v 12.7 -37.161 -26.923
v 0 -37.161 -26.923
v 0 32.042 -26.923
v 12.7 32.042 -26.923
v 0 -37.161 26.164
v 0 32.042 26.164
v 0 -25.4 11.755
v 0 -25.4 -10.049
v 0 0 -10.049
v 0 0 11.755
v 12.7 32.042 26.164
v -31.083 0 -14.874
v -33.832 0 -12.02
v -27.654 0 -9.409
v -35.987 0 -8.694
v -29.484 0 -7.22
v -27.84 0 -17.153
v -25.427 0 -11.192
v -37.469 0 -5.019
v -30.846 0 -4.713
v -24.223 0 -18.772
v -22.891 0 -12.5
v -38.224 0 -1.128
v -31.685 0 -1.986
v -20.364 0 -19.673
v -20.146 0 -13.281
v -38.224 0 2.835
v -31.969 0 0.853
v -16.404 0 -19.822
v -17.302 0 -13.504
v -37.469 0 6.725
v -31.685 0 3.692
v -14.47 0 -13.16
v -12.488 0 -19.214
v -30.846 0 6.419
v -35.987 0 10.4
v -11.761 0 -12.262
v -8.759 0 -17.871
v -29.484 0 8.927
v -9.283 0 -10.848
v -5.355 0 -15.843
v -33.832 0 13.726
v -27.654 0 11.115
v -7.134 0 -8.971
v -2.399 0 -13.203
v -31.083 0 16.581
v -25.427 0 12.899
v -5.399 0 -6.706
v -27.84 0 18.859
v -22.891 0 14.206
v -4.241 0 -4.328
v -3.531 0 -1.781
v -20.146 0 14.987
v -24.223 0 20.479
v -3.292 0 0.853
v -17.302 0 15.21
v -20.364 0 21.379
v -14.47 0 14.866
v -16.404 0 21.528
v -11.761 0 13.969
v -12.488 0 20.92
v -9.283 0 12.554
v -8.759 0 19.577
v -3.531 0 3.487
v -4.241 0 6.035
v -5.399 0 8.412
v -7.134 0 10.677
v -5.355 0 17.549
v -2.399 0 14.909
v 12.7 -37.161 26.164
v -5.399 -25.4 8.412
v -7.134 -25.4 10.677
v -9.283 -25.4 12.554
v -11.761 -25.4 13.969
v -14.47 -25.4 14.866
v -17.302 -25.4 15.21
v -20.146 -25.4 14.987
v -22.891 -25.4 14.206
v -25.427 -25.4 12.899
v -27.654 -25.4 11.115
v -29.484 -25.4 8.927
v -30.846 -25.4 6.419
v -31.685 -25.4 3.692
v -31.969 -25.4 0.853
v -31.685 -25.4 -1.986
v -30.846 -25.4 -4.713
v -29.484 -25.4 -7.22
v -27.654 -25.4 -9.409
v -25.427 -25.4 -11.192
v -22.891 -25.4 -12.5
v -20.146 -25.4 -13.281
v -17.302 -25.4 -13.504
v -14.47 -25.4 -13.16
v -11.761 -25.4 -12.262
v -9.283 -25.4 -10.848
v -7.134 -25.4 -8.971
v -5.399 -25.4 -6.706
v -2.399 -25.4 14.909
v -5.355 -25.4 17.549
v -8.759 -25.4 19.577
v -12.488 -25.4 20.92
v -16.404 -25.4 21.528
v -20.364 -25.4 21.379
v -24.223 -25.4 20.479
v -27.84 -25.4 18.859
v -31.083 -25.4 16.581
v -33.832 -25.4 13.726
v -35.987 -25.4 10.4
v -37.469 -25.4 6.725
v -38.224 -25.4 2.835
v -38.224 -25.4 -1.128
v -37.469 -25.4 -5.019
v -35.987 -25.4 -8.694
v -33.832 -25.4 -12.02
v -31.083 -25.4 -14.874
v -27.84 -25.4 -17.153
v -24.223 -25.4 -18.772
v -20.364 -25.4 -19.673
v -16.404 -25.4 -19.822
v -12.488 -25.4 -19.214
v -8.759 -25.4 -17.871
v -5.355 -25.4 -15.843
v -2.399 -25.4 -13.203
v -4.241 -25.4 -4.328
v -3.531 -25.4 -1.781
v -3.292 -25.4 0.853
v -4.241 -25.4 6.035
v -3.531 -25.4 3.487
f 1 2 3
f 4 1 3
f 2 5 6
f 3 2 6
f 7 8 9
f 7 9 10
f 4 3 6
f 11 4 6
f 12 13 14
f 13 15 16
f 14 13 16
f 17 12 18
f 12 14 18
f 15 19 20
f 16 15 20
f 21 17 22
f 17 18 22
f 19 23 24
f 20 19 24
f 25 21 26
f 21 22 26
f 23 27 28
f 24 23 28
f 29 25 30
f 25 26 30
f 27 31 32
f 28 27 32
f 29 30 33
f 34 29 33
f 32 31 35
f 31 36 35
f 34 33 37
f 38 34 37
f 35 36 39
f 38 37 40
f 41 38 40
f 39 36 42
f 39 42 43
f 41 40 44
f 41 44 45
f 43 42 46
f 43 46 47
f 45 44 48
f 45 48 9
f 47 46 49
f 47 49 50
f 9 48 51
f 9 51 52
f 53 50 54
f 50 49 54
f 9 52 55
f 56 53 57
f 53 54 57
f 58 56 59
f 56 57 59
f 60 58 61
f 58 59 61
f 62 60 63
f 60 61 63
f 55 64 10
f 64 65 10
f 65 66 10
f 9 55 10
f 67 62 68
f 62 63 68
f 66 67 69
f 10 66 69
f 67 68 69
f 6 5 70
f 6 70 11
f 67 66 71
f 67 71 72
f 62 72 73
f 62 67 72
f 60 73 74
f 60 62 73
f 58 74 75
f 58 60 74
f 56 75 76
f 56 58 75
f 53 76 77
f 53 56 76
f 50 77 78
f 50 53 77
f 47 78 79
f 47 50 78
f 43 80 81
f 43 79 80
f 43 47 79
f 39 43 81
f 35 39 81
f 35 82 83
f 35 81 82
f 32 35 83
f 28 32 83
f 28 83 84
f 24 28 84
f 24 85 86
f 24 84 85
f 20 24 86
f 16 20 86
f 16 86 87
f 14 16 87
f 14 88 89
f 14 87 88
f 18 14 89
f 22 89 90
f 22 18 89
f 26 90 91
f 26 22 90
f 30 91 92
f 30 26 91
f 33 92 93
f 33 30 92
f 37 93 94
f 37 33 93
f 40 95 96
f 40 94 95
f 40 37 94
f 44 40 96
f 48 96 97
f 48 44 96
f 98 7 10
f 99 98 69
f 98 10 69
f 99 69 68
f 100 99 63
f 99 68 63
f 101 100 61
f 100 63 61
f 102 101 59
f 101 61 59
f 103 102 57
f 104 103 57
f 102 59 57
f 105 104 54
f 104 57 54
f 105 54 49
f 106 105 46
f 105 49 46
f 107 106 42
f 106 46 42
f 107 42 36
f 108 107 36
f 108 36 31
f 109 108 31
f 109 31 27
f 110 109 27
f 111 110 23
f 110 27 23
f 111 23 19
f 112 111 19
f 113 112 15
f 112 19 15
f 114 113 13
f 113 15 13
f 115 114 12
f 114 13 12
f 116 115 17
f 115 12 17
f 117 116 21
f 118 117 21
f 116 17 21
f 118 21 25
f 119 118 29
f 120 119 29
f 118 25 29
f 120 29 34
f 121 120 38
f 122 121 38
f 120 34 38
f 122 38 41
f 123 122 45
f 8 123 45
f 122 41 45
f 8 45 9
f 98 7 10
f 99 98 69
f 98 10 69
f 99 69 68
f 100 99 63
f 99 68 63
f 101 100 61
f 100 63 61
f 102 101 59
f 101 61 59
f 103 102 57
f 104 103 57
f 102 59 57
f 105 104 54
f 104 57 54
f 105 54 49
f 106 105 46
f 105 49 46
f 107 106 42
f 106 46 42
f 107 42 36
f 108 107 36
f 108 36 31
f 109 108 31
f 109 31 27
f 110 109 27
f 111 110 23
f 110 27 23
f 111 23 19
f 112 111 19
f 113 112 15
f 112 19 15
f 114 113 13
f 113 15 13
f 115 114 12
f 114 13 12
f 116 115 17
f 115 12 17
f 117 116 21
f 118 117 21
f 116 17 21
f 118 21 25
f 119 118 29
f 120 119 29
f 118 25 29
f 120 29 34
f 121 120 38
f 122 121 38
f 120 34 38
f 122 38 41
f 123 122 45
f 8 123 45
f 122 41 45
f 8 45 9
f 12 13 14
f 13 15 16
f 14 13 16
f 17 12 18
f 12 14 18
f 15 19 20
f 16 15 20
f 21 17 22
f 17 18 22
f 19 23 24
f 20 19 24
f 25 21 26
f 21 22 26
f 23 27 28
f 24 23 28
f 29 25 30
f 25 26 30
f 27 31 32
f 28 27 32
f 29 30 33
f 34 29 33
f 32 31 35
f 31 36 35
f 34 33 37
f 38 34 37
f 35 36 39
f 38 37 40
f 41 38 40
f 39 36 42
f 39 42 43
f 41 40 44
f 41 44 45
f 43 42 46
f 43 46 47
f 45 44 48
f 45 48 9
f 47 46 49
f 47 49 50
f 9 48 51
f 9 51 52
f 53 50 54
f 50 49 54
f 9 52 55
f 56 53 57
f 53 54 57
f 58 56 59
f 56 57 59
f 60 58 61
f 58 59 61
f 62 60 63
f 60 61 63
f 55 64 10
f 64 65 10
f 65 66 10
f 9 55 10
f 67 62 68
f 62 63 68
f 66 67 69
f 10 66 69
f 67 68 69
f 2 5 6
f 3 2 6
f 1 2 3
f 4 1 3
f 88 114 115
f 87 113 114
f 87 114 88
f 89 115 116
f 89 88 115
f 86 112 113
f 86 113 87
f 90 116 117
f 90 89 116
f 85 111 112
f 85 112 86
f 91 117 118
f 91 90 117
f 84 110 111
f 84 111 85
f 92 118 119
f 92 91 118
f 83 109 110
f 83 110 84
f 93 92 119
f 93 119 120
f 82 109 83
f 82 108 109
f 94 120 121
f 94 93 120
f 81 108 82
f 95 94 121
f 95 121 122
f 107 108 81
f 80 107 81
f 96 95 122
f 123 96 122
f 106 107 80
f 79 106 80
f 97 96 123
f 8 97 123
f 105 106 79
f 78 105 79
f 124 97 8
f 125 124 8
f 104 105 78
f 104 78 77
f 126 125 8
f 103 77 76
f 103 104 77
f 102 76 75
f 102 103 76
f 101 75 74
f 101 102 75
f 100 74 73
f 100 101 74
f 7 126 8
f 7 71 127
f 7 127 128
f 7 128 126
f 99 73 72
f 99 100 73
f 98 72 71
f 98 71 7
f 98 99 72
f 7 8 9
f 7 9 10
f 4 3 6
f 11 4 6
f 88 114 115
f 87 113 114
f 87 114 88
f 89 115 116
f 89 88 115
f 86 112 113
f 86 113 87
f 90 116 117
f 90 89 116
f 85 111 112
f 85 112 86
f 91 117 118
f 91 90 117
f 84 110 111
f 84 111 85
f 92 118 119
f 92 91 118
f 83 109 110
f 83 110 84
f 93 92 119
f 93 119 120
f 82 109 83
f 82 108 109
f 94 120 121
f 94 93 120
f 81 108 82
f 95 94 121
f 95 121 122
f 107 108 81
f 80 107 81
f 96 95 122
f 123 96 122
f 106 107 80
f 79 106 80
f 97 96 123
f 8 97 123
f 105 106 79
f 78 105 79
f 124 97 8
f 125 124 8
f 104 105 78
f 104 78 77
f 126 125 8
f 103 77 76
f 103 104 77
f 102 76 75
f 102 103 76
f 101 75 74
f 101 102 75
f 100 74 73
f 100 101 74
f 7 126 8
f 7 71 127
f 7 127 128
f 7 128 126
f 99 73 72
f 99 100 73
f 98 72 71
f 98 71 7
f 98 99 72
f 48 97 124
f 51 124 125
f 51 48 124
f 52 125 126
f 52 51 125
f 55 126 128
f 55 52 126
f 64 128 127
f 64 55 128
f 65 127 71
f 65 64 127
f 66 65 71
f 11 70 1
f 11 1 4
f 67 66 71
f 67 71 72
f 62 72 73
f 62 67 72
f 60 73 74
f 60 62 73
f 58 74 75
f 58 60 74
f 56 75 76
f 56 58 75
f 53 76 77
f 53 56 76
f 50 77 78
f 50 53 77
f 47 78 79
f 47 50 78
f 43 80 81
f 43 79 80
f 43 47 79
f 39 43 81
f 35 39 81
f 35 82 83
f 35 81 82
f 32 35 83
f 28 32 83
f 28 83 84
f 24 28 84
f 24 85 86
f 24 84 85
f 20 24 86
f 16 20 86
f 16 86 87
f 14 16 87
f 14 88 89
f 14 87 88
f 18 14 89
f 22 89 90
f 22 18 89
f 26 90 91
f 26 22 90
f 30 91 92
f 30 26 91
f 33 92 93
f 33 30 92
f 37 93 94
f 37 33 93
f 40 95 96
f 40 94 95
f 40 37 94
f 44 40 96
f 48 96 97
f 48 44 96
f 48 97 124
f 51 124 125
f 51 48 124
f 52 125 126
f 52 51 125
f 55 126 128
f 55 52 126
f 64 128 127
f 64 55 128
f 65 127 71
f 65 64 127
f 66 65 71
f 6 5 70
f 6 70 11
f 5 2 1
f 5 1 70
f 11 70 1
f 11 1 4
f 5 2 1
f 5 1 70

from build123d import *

# Parameters (mm, degrees)
F0_W     = 69.2029632628
F0_H     = 53.0872046947
F1_DEPTH = 12.7
F3_DEPTH = 25.4
F7_DEPTH = 25.4
F8_DEPTH = 37.1620410511
F9_DEPTH = 12.7


# Not quite as in the source:
# - the program builds the solid bodies; features that only make, move or delete a surface that nothing else refers to are left out


with BuildPart() as f1:
    # F0 (on Right) → F1 (new body)
    with BuildSketch(Plane.YZ):
        with Locations((-2.5595594198, -0.3791954368)):
            Rectangle(F0_W, F0_H)
    extrude(amount=F1_DEPTH)


with BuildPart() as f3:
    # F2 (on Front) → F3 (new body)
    with BuildSketch(Plane.XZ):
        with BuildLine():
            Line((0, -10.0486492738), (0, 11.755024083))
            ThreePointArc((0, 11.755024083), (-38.3185949727, 0.8531874046), (0, -10.0486492738))
        make_face()
    extrude(amount=F3_DEPTH)


with BuildPart() as f7:
    # F2 (on Front) → F7 (new body)
    with BuildSketch(Plane.XZ):
        with BuildLine():
            Line((0, -10.0486492738), (0, 11.755024083))
            ThreePointArc((0, 11.755024083), (-38.3185949727, 0.8531874046), (0, -10.0486492738))
        make_face()
    extrude(amount=F7_DEPTH)


with BuildPart() as f8_tool:
    # F4 (on Front) → F8 (new body, through all)
    with BuildSketch(Plane.XZ):
        with BuildLine():
            ThreePointArc((-5.3990000004, -6.7059981609), (-3.2919727747, 0.8531874046), (-5.3990000004, 8.41237297))
            ThreePointArc((-5.3990000004, 8.41237297), (-31.9685935974, 0.8531874046), (-5.3990000004, -6.7059981609))
        make_face()
    extrude(amount=F8_DEPTH)


with BuildPart() as f3_1:
    add(f3.part)

    # F8: cut by f8_tool
    add(f8_tool.part, mode=Mode.SUBTRACT)


with BuildPart() as f7_1:
    add(f7.part)

    # F8: cut by f8_tool
    add(f8_tool.part, mode=Mode.SUBTRACT)


with BuildPart() as f9:
    # F0 (on Right) → F9 (new body)
    with BuildSketch(Plane.YZ):
        with Locations((-2.5595594198, -0.3791954368)):
            Rectangle(F0_W, F0_H)
    extrude(amount=F9_DEPTH)


solid = Compound([f1.part, f3_1.part, f7_1.part, f9.part])
